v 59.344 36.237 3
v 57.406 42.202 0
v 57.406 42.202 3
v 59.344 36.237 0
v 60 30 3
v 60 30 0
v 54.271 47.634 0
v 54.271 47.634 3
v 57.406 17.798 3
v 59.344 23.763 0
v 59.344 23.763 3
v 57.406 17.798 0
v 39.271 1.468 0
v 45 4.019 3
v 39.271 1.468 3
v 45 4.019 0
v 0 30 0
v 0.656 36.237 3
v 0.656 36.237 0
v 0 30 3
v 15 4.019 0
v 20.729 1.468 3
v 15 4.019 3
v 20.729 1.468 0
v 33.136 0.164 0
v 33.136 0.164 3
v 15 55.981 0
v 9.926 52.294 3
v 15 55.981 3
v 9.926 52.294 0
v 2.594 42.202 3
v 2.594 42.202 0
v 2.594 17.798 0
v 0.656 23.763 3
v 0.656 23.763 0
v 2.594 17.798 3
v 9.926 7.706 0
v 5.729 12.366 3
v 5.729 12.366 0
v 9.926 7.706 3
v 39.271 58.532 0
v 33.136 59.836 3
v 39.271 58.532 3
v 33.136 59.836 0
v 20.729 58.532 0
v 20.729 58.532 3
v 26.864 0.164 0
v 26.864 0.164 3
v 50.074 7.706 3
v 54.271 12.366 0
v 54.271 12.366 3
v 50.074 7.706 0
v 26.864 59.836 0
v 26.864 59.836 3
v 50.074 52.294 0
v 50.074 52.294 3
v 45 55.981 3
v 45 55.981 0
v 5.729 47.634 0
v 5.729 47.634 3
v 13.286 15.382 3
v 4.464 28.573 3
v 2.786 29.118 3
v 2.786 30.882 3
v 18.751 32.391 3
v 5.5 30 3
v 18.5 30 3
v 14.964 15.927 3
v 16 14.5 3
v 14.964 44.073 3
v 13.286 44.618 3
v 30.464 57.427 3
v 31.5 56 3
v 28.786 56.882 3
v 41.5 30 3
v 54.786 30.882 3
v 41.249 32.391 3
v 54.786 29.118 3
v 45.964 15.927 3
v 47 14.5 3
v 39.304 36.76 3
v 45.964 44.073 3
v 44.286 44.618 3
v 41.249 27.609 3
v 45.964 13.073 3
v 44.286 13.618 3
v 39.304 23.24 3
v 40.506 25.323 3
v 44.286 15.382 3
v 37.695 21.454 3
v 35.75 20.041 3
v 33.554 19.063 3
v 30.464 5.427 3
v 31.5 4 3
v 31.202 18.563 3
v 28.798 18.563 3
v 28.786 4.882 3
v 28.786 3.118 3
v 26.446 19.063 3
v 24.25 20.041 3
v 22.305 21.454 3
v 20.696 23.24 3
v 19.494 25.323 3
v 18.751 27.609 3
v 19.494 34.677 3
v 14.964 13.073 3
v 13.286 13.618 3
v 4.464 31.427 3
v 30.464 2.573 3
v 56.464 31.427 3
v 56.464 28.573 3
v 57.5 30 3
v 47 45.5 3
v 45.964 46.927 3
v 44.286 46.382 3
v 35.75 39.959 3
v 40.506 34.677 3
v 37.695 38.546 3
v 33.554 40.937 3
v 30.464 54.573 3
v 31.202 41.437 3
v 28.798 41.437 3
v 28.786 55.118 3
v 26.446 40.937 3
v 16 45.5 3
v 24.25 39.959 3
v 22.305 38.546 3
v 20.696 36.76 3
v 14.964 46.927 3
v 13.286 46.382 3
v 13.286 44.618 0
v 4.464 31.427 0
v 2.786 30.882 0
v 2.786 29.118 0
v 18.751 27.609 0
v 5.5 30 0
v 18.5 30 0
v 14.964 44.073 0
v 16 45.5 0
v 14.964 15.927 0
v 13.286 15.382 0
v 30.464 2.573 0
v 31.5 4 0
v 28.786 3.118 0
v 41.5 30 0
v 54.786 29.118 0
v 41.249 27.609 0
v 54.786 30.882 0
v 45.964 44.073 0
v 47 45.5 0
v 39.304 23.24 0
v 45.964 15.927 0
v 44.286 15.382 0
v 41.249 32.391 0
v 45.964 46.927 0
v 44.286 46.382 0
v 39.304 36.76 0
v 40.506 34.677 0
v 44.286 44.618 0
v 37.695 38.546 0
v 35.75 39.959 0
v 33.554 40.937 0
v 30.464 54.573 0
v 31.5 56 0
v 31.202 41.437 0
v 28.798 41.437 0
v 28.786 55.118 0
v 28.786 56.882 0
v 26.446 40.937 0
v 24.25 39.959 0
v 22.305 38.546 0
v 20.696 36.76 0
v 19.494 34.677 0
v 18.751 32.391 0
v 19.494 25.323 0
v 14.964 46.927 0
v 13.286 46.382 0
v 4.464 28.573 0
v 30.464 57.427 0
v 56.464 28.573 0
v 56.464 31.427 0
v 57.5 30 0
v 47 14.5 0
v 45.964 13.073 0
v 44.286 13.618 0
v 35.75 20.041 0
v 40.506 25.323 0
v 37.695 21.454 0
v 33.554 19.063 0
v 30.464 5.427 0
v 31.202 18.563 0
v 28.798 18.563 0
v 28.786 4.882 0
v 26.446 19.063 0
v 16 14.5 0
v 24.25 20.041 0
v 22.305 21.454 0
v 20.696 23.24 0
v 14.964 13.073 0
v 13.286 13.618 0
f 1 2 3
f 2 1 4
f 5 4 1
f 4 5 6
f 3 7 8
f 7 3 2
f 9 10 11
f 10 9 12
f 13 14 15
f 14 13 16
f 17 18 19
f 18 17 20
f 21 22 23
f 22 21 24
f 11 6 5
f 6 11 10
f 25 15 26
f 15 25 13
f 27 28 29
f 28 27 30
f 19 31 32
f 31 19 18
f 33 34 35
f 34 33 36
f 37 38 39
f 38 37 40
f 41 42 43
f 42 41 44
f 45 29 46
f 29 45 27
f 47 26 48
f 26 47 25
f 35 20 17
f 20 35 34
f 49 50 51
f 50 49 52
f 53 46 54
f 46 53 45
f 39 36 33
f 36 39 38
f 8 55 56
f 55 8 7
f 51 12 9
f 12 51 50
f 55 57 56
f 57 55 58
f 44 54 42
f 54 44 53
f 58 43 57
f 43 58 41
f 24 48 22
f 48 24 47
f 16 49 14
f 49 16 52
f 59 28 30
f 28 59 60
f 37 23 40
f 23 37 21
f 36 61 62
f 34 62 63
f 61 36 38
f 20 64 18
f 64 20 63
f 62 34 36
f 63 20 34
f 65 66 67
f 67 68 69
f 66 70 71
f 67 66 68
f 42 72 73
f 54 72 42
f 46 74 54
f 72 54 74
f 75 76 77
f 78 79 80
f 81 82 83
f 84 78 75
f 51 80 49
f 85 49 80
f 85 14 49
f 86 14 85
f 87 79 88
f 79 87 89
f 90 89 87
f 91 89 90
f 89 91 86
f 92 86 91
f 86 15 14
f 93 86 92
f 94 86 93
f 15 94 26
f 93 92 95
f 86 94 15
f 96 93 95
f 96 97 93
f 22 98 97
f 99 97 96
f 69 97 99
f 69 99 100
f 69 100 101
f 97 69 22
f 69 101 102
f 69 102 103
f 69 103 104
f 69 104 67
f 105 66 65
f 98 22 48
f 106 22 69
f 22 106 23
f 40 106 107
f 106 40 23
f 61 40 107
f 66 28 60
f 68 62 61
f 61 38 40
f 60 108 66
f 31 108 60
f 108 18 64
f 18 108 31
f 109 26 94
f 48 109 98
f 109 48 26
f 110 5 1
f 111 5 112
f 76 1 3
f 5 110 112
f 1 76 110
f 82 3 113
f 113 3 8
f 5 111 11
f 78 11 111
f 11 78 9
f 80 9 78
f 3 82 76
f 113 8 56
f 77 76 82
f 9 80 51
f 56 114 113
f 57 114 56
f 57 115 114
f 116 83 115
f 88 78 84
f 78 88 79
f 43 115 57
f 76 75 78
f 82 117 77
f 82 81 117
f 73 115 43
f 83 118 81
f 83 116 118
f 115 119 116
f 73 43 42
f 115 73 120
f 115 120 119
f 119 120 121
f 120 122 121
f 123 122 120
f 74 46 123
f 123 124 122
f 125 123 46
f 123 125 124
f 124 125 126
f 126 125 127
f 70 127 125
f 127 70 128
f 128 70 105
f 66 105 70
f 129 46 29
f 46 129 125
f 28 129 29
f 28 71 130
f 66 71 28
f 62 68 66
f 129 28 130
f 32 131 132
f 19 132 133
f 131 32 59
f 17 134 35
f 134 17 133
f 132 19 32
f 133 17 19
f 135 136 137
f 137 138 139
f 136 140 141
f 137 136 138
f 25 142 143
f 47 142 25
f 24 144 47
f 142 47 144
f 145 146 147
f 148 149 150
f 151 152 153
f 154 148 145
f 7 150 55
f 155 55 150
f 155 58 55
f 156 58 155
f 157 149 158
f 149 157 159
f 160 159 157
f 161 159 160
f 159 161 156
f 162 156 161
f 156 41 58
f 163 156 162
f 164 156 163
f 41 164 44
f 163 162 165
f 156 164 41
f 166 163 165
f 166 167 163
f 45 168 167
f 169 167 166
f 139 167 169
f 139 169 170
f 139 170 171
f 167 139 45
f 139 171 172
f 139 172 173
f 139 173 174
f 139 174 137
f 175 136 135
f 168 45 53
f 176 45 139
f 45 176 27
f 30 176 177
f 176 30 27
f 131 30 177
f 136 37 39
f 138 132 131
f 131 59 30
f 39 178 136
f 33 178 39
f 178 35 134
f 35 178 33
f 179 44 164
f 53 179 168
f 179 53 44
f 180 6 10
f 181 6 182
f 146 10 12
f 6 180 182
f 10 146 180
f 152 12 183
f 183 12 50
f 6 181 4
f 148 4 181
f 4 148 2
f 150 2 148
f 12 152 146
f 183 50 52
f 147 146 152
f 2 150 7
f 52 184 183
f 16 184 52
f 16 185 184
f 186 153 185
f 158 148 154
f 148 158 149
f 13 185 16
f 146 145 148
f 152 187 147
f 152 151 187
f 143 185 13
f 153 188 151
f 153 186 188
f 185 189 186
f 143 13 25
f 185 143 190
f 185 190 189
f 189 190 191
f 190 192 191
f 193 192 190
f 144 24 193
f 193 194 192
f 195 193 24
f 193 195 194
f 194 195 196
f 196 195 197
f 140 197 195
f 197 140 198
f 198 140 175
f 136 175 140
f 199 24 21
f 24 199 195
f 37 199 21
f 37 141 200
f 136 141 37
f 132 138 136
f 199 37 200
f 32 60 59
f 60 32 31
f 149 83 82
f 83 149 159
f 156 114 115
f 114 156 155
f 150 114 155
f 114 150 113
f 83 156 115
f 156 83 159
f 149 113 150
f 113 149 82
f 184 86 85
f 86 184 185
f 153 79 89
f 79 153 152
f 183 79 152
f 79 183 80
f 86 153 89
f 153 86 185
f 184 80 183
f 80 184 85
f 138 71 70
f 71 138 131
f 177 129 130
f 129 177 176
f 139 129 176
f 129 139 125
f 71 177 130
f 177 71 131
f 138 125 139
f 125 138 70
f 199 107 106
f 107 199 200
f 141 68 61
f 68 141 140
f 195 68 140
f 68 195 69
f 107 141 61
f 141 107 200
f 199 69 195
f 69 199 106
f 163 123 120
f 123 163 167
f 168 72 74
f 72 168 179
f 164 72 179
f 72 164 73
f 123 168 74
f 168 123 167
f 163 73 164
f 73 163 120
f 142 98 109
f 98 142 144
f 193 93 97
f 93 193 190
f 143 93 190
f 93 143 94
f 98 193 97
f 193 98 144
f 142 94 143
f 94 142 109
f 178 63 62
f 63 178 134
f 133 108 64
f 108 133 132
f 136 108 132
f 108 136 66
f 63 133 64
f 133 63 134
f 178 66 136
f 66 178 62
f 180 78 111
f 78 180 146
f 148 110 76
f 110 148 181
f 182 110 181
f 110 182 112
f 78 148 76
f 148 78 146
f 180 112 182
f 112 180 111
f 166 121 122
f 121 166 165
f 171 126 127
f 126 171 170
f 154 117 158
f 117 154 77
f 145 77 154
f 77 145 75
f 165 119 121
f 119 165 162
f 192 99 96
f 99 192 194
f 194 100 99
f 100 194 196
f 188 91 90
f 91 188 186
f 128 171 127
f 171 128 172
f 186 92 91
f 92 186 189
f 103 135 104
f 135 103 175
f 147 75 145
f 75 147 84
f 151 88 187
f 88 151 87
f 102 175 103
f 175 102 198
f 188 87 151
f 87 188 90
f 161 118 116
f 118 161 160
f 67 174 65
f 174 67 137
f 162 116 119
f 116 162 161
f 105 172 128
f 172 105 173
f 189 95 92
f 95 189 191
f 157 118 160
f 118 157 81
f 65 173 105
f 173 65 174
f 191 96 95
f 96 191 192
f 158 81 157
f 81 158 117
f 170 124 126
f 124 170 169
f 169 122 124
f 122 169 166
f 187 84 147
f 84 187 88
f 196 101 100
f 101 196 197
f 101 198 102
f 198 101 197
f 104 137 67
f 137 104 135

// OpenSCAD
// file: modules.scad
thickness = 3;
ultrasonic_hole_radius = 8.25;
ultrasonic_hole_distance = 25.5;
pin_side = 2.5;



module roundExtract(pos_x, pos_y, radius) {
     translate([pos_x, pos_y,0]) 
		cylinder(h = thickness, r = radius);
 }

module squareExtract(pos_x, pos_y, width, length) {
	translate([pos_x, pos_y,0])
		cube(size = [width, length, thickness]);
}

module ultrasonicExtract(pos_x, pos_y, rotation) {
	translate([pos_x,pos_y,0]){
		rotate([0,0,rotation]) {
			union(){ 
				translate([0,0,0])
					cylinder(h = thickness, r = ultrasonic_hole_radius);
				translate([ultrasonic_hole_distance,0,0])
					cylinder(h = thickness, r = ultrasonic_hole_radius);
				translate([ultrasonic_hole_distance/2-3.75,-9,0])
					cube(size = [7.5, 2, thickness]);
				translate([ultrasonic_hole_distance/2-4.75,6,0])
					cube(size = [10, 4, thickness]);
			}
		}
	}
}

module IMUExtract(pos_x,pos_y, rotation) {
	translate([pos_x,pos_y,0]){
		rotate([0,0,rotation]) {
			union(){ 
				roundExtract(13,3,2);
				roundExtract(13,25,2);
				squareExtract(0,0,pin_side,pin_side*11);
			}
		}
	}
}

module stepperExtraction(pos_x,pos_y, rotation) {
	translate([pos_x,pos_y,0]){
		rotate([0,0,rotation]) {
			union(){ 
				roundExtract(14,9,2);
				roundExtract(10,33,2);
				squareExtract(1.5,1.5,pin_side,pin_side*3);//3 pins
				squareExtract(20-pin_side-1.5,1.5,pin_side,pin_side*2);//2 pin
				squareExtract(20-pin_side-1.5,32,pin_side,pin_side*4);//4 pins
			}
		}
	}

}

module screwAttach(pos_x, pos_y, pos_z, width, length, height, rotation) {
translate([pos_x,pos_y, pos_z]){
		rotate([0,0,rotation]) {
			difference(){ 
				cube(width,length,height);
				translate([width/2, 0,height/2]) {
					rotate([270,0,0]) {
						cylinder(h = 10, r=2);
					}
				}
				
			}
		}
	}


}
// main file
include <modules.scad>;

motor_cache_side = 60;
motor_side = 42.3;
thickness = 3;
M3_radius = 1.5;
motor_hole_distance = 31;
cache_hole_distance = 48;
motor_cicle_radius = 11.5;
circle_radius = 30;
screw_cache_offset = 2;

difference(){
    
    translate([circle_radius,circle_radius,0]){
        cylinder(h = thickness, r = circle_radius);
    }
    
	//Holes for motor's screws
	roundExtract(motor_cache_side/2 + motor_hole_distance/2, motor_cache_side/2 + motor_hole_distance/2, M3_radius);	
	roundExtract(motor_cache_side/2 + motor_hole_distance/2, motor_cache_side/2 - motor_hole_distance/2, M3_radius);		
	roundExtract(motor_cache_side/2 - motor_hole_distance/2, motor_cache_side/2 + motor_hole_distance/2, M3_radius);		
	roundExtract(motor_cache_side/2 - motor_hole_distance/2, motor_cache_side/2 - motor_hole_distance/2, M3_radius);

	//Holes for cache's screws
	roundExtract(motor_cache_side/2, motor_cache_side/2 + cache_hole_distance/2 + screw_cache_offset, M3_radius);	
	roundExtract(motor_cache_side/2, motor_cache_side/2 - cache_hole_distance/2 - screw_cache_offset, M3_radius);
	roundExtract(motor_cache_side/2 - cache_hole_distance/2 - screw_cache_offset, motor_cache_side/2, M3_radius);
	roundExtract(motor_cache_side/2 + cache_hole_distance/2 + screw_cache_offset, motor_cache_side/2, M3_radius);

	//Holes for the motor circle
	roundExtract(motor_cache_side/2, motor_cache_side/2, motor_cicle_radius);
}
